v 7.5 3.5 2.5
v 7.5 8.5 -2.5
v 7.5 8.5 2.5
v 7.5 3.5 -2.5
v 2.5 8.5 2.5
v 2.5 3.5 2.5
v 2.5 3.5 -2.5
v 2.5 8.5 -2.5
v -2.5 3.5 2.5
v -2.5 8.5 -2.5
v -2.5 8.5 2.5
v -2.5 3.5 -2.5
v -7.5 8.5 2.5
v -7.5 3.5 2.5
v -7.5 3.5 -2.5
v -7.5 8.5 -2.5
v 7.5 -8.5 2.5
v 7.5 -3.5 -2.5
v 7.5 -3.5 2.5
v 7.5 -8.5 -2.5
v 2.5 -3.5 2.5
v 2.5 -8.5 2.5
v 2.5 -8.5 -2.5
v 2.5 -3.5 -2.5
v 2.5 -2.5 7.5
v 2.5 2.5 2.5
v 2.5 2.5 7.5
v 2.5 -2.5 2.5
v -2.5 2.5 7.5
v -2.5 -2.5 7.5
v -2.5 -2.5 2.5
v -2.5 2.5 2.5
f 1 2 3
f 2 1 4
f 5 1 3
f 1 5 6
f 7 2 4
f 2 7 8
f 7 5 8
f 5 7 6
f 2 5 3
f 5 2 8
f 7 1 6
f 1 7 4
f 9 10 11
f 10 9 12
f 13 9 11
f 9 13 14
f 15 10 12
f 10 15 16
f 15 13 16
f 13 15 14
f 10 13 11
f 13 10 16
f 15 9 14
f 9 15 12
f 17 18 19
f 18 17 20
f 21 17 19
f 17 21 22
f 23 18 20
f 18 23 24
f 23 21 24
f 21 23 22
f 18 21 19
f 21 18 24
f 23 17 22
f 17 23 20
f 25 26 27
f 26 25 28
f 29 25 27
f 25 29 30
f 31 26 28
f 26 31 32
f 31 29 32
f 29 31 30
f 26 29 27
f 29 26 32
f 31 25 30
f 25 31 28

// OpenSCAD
BcenterX=1;
BcenterY=0;
BcenterZ=6;
Blength=17;
Blength_2 = Blength/2;
MAX_DEPTH = 4;

cubes = [[5,6,0],[-5,6,0],[5,-6,0],[0,0,5]];

module surroudingBoxTest(){
	for (i = [0:3]) {
    translate([cubes[i][0],cubes[i][1],cubes[i][2]]) cube(5,center=true);
			}
    }
    
    *color("grey",0.1) translate([1,0,6]) cube(17,center=true);
    function checkRange(val,center,range) = val > (center - range) && val < (center + range); 
    function isInsideCube(x,y,z,cubeX,cubeY,cubeZ,size) = checkRange(x,cubeX,size) && checkRange(y,cubeY,size) && checkRange(z,cubeZ,size);  
	function isInside(x,y,z) = 
							 isInsideCube(x,y,z,cubes[0][0],cubes[0][1],cubes[0][2],5) ||
							 isInsideCube(x,y,z,cubes[1][0],cubes[1][1],cubes[1][2],5) || 
							 isInsideCube(x,y,z,cubes[2][0],cubes[2][1],cubes[2][2],5) || 
							 isInsideCube(x,y,z,cubes[3][0],cubes[3][1],cubes[3][2],5);

 module splittingPlanes(centerX,centerY,centerZ,length_2,depth) {                       
 	
    if(isInside(centerX,centerY,centerZ) ) {										
    																					
    %color("red",0.2){
    polyhedron(
  				points=[ [centerX-length_2,centerY-length_2,centerZ],[centerX-length_2,centerY+length_2,centerZ],[centerX+length_2,centerY+length_2,centerZ],[centerX+length_2,centerY-length_2,centerZ],
  		   				[centerX,centerY-length_2,centerZ-length_2],[centerX,centerY-length_2,centerZ+length_2],[centerX,centerY+length_2,centerZ+length_2],[centerX,centerY+length_2,centerZ-length_2],
  		   				[centerX-length_2,centerY,centerZ-length_2],[centerX-length_2,centerY,centerZ+length_2],[centerX+length_2,centerY,centerZ+length_2],[centerX+length_2,centerY,centerZ-length_2]],                                 
  				faces=[ [0,1,2],[2,3,0],[4,5,6],[6,7,4],[8,9,10],[10,11,8]]);
		}
	}
	if(depth >= 0) {
			next_length = length_2/2;
			next_depth = depth-1;
			params = [ 
						[centerX-next_length,centerY-next_length,centerZ+next_length], 
						[centerX+next_length,centerY-next_length,centerZ+next_length], 
						[centerX-next_length,centerY+next_length,centerZ+next_length], 
						[centerX+next_length,centerY+next_length,centerZ+next_length], 
						[centerX-next_length,centerY-next_length,centerZ-next_length], 
						[centerX+next_length,centerY-next_length,centerZ-next_length], 
						[centerX-next_length,centerY+next_length,centerZ-next_length], 
						[centerX+next_length,centerY+next_length,centerZ-next_length]];
						
			for (i = [0:7]) {
				if(isInside(params[i][0],params[i][1],params[i][2])) {
				splittingPlanes(params[i][0],params[i][1],params[i][2],next_length,next_depth);
				}	
			}
		}
    
 }   
    surroudingBoxTest();
    splittingPlanes(1,0,6,Blength_2,MAX_DEPTH);
    length = Blength_2/2;
    //splittingPlanes(1-length,0-length,6+length,length);
   /*{max=Dot{x=7.5, y=8.5, z=7.5}, min=Dot{x=-7.5, y=-8.5, z=-2.5}, edgeBegin=Dot{x=-7.5, y=-8.5, z=-2.5}, edgeEnd=Dot{x=9.5, y=8.5, z=14.5}, edgeLength=17.0}*/
